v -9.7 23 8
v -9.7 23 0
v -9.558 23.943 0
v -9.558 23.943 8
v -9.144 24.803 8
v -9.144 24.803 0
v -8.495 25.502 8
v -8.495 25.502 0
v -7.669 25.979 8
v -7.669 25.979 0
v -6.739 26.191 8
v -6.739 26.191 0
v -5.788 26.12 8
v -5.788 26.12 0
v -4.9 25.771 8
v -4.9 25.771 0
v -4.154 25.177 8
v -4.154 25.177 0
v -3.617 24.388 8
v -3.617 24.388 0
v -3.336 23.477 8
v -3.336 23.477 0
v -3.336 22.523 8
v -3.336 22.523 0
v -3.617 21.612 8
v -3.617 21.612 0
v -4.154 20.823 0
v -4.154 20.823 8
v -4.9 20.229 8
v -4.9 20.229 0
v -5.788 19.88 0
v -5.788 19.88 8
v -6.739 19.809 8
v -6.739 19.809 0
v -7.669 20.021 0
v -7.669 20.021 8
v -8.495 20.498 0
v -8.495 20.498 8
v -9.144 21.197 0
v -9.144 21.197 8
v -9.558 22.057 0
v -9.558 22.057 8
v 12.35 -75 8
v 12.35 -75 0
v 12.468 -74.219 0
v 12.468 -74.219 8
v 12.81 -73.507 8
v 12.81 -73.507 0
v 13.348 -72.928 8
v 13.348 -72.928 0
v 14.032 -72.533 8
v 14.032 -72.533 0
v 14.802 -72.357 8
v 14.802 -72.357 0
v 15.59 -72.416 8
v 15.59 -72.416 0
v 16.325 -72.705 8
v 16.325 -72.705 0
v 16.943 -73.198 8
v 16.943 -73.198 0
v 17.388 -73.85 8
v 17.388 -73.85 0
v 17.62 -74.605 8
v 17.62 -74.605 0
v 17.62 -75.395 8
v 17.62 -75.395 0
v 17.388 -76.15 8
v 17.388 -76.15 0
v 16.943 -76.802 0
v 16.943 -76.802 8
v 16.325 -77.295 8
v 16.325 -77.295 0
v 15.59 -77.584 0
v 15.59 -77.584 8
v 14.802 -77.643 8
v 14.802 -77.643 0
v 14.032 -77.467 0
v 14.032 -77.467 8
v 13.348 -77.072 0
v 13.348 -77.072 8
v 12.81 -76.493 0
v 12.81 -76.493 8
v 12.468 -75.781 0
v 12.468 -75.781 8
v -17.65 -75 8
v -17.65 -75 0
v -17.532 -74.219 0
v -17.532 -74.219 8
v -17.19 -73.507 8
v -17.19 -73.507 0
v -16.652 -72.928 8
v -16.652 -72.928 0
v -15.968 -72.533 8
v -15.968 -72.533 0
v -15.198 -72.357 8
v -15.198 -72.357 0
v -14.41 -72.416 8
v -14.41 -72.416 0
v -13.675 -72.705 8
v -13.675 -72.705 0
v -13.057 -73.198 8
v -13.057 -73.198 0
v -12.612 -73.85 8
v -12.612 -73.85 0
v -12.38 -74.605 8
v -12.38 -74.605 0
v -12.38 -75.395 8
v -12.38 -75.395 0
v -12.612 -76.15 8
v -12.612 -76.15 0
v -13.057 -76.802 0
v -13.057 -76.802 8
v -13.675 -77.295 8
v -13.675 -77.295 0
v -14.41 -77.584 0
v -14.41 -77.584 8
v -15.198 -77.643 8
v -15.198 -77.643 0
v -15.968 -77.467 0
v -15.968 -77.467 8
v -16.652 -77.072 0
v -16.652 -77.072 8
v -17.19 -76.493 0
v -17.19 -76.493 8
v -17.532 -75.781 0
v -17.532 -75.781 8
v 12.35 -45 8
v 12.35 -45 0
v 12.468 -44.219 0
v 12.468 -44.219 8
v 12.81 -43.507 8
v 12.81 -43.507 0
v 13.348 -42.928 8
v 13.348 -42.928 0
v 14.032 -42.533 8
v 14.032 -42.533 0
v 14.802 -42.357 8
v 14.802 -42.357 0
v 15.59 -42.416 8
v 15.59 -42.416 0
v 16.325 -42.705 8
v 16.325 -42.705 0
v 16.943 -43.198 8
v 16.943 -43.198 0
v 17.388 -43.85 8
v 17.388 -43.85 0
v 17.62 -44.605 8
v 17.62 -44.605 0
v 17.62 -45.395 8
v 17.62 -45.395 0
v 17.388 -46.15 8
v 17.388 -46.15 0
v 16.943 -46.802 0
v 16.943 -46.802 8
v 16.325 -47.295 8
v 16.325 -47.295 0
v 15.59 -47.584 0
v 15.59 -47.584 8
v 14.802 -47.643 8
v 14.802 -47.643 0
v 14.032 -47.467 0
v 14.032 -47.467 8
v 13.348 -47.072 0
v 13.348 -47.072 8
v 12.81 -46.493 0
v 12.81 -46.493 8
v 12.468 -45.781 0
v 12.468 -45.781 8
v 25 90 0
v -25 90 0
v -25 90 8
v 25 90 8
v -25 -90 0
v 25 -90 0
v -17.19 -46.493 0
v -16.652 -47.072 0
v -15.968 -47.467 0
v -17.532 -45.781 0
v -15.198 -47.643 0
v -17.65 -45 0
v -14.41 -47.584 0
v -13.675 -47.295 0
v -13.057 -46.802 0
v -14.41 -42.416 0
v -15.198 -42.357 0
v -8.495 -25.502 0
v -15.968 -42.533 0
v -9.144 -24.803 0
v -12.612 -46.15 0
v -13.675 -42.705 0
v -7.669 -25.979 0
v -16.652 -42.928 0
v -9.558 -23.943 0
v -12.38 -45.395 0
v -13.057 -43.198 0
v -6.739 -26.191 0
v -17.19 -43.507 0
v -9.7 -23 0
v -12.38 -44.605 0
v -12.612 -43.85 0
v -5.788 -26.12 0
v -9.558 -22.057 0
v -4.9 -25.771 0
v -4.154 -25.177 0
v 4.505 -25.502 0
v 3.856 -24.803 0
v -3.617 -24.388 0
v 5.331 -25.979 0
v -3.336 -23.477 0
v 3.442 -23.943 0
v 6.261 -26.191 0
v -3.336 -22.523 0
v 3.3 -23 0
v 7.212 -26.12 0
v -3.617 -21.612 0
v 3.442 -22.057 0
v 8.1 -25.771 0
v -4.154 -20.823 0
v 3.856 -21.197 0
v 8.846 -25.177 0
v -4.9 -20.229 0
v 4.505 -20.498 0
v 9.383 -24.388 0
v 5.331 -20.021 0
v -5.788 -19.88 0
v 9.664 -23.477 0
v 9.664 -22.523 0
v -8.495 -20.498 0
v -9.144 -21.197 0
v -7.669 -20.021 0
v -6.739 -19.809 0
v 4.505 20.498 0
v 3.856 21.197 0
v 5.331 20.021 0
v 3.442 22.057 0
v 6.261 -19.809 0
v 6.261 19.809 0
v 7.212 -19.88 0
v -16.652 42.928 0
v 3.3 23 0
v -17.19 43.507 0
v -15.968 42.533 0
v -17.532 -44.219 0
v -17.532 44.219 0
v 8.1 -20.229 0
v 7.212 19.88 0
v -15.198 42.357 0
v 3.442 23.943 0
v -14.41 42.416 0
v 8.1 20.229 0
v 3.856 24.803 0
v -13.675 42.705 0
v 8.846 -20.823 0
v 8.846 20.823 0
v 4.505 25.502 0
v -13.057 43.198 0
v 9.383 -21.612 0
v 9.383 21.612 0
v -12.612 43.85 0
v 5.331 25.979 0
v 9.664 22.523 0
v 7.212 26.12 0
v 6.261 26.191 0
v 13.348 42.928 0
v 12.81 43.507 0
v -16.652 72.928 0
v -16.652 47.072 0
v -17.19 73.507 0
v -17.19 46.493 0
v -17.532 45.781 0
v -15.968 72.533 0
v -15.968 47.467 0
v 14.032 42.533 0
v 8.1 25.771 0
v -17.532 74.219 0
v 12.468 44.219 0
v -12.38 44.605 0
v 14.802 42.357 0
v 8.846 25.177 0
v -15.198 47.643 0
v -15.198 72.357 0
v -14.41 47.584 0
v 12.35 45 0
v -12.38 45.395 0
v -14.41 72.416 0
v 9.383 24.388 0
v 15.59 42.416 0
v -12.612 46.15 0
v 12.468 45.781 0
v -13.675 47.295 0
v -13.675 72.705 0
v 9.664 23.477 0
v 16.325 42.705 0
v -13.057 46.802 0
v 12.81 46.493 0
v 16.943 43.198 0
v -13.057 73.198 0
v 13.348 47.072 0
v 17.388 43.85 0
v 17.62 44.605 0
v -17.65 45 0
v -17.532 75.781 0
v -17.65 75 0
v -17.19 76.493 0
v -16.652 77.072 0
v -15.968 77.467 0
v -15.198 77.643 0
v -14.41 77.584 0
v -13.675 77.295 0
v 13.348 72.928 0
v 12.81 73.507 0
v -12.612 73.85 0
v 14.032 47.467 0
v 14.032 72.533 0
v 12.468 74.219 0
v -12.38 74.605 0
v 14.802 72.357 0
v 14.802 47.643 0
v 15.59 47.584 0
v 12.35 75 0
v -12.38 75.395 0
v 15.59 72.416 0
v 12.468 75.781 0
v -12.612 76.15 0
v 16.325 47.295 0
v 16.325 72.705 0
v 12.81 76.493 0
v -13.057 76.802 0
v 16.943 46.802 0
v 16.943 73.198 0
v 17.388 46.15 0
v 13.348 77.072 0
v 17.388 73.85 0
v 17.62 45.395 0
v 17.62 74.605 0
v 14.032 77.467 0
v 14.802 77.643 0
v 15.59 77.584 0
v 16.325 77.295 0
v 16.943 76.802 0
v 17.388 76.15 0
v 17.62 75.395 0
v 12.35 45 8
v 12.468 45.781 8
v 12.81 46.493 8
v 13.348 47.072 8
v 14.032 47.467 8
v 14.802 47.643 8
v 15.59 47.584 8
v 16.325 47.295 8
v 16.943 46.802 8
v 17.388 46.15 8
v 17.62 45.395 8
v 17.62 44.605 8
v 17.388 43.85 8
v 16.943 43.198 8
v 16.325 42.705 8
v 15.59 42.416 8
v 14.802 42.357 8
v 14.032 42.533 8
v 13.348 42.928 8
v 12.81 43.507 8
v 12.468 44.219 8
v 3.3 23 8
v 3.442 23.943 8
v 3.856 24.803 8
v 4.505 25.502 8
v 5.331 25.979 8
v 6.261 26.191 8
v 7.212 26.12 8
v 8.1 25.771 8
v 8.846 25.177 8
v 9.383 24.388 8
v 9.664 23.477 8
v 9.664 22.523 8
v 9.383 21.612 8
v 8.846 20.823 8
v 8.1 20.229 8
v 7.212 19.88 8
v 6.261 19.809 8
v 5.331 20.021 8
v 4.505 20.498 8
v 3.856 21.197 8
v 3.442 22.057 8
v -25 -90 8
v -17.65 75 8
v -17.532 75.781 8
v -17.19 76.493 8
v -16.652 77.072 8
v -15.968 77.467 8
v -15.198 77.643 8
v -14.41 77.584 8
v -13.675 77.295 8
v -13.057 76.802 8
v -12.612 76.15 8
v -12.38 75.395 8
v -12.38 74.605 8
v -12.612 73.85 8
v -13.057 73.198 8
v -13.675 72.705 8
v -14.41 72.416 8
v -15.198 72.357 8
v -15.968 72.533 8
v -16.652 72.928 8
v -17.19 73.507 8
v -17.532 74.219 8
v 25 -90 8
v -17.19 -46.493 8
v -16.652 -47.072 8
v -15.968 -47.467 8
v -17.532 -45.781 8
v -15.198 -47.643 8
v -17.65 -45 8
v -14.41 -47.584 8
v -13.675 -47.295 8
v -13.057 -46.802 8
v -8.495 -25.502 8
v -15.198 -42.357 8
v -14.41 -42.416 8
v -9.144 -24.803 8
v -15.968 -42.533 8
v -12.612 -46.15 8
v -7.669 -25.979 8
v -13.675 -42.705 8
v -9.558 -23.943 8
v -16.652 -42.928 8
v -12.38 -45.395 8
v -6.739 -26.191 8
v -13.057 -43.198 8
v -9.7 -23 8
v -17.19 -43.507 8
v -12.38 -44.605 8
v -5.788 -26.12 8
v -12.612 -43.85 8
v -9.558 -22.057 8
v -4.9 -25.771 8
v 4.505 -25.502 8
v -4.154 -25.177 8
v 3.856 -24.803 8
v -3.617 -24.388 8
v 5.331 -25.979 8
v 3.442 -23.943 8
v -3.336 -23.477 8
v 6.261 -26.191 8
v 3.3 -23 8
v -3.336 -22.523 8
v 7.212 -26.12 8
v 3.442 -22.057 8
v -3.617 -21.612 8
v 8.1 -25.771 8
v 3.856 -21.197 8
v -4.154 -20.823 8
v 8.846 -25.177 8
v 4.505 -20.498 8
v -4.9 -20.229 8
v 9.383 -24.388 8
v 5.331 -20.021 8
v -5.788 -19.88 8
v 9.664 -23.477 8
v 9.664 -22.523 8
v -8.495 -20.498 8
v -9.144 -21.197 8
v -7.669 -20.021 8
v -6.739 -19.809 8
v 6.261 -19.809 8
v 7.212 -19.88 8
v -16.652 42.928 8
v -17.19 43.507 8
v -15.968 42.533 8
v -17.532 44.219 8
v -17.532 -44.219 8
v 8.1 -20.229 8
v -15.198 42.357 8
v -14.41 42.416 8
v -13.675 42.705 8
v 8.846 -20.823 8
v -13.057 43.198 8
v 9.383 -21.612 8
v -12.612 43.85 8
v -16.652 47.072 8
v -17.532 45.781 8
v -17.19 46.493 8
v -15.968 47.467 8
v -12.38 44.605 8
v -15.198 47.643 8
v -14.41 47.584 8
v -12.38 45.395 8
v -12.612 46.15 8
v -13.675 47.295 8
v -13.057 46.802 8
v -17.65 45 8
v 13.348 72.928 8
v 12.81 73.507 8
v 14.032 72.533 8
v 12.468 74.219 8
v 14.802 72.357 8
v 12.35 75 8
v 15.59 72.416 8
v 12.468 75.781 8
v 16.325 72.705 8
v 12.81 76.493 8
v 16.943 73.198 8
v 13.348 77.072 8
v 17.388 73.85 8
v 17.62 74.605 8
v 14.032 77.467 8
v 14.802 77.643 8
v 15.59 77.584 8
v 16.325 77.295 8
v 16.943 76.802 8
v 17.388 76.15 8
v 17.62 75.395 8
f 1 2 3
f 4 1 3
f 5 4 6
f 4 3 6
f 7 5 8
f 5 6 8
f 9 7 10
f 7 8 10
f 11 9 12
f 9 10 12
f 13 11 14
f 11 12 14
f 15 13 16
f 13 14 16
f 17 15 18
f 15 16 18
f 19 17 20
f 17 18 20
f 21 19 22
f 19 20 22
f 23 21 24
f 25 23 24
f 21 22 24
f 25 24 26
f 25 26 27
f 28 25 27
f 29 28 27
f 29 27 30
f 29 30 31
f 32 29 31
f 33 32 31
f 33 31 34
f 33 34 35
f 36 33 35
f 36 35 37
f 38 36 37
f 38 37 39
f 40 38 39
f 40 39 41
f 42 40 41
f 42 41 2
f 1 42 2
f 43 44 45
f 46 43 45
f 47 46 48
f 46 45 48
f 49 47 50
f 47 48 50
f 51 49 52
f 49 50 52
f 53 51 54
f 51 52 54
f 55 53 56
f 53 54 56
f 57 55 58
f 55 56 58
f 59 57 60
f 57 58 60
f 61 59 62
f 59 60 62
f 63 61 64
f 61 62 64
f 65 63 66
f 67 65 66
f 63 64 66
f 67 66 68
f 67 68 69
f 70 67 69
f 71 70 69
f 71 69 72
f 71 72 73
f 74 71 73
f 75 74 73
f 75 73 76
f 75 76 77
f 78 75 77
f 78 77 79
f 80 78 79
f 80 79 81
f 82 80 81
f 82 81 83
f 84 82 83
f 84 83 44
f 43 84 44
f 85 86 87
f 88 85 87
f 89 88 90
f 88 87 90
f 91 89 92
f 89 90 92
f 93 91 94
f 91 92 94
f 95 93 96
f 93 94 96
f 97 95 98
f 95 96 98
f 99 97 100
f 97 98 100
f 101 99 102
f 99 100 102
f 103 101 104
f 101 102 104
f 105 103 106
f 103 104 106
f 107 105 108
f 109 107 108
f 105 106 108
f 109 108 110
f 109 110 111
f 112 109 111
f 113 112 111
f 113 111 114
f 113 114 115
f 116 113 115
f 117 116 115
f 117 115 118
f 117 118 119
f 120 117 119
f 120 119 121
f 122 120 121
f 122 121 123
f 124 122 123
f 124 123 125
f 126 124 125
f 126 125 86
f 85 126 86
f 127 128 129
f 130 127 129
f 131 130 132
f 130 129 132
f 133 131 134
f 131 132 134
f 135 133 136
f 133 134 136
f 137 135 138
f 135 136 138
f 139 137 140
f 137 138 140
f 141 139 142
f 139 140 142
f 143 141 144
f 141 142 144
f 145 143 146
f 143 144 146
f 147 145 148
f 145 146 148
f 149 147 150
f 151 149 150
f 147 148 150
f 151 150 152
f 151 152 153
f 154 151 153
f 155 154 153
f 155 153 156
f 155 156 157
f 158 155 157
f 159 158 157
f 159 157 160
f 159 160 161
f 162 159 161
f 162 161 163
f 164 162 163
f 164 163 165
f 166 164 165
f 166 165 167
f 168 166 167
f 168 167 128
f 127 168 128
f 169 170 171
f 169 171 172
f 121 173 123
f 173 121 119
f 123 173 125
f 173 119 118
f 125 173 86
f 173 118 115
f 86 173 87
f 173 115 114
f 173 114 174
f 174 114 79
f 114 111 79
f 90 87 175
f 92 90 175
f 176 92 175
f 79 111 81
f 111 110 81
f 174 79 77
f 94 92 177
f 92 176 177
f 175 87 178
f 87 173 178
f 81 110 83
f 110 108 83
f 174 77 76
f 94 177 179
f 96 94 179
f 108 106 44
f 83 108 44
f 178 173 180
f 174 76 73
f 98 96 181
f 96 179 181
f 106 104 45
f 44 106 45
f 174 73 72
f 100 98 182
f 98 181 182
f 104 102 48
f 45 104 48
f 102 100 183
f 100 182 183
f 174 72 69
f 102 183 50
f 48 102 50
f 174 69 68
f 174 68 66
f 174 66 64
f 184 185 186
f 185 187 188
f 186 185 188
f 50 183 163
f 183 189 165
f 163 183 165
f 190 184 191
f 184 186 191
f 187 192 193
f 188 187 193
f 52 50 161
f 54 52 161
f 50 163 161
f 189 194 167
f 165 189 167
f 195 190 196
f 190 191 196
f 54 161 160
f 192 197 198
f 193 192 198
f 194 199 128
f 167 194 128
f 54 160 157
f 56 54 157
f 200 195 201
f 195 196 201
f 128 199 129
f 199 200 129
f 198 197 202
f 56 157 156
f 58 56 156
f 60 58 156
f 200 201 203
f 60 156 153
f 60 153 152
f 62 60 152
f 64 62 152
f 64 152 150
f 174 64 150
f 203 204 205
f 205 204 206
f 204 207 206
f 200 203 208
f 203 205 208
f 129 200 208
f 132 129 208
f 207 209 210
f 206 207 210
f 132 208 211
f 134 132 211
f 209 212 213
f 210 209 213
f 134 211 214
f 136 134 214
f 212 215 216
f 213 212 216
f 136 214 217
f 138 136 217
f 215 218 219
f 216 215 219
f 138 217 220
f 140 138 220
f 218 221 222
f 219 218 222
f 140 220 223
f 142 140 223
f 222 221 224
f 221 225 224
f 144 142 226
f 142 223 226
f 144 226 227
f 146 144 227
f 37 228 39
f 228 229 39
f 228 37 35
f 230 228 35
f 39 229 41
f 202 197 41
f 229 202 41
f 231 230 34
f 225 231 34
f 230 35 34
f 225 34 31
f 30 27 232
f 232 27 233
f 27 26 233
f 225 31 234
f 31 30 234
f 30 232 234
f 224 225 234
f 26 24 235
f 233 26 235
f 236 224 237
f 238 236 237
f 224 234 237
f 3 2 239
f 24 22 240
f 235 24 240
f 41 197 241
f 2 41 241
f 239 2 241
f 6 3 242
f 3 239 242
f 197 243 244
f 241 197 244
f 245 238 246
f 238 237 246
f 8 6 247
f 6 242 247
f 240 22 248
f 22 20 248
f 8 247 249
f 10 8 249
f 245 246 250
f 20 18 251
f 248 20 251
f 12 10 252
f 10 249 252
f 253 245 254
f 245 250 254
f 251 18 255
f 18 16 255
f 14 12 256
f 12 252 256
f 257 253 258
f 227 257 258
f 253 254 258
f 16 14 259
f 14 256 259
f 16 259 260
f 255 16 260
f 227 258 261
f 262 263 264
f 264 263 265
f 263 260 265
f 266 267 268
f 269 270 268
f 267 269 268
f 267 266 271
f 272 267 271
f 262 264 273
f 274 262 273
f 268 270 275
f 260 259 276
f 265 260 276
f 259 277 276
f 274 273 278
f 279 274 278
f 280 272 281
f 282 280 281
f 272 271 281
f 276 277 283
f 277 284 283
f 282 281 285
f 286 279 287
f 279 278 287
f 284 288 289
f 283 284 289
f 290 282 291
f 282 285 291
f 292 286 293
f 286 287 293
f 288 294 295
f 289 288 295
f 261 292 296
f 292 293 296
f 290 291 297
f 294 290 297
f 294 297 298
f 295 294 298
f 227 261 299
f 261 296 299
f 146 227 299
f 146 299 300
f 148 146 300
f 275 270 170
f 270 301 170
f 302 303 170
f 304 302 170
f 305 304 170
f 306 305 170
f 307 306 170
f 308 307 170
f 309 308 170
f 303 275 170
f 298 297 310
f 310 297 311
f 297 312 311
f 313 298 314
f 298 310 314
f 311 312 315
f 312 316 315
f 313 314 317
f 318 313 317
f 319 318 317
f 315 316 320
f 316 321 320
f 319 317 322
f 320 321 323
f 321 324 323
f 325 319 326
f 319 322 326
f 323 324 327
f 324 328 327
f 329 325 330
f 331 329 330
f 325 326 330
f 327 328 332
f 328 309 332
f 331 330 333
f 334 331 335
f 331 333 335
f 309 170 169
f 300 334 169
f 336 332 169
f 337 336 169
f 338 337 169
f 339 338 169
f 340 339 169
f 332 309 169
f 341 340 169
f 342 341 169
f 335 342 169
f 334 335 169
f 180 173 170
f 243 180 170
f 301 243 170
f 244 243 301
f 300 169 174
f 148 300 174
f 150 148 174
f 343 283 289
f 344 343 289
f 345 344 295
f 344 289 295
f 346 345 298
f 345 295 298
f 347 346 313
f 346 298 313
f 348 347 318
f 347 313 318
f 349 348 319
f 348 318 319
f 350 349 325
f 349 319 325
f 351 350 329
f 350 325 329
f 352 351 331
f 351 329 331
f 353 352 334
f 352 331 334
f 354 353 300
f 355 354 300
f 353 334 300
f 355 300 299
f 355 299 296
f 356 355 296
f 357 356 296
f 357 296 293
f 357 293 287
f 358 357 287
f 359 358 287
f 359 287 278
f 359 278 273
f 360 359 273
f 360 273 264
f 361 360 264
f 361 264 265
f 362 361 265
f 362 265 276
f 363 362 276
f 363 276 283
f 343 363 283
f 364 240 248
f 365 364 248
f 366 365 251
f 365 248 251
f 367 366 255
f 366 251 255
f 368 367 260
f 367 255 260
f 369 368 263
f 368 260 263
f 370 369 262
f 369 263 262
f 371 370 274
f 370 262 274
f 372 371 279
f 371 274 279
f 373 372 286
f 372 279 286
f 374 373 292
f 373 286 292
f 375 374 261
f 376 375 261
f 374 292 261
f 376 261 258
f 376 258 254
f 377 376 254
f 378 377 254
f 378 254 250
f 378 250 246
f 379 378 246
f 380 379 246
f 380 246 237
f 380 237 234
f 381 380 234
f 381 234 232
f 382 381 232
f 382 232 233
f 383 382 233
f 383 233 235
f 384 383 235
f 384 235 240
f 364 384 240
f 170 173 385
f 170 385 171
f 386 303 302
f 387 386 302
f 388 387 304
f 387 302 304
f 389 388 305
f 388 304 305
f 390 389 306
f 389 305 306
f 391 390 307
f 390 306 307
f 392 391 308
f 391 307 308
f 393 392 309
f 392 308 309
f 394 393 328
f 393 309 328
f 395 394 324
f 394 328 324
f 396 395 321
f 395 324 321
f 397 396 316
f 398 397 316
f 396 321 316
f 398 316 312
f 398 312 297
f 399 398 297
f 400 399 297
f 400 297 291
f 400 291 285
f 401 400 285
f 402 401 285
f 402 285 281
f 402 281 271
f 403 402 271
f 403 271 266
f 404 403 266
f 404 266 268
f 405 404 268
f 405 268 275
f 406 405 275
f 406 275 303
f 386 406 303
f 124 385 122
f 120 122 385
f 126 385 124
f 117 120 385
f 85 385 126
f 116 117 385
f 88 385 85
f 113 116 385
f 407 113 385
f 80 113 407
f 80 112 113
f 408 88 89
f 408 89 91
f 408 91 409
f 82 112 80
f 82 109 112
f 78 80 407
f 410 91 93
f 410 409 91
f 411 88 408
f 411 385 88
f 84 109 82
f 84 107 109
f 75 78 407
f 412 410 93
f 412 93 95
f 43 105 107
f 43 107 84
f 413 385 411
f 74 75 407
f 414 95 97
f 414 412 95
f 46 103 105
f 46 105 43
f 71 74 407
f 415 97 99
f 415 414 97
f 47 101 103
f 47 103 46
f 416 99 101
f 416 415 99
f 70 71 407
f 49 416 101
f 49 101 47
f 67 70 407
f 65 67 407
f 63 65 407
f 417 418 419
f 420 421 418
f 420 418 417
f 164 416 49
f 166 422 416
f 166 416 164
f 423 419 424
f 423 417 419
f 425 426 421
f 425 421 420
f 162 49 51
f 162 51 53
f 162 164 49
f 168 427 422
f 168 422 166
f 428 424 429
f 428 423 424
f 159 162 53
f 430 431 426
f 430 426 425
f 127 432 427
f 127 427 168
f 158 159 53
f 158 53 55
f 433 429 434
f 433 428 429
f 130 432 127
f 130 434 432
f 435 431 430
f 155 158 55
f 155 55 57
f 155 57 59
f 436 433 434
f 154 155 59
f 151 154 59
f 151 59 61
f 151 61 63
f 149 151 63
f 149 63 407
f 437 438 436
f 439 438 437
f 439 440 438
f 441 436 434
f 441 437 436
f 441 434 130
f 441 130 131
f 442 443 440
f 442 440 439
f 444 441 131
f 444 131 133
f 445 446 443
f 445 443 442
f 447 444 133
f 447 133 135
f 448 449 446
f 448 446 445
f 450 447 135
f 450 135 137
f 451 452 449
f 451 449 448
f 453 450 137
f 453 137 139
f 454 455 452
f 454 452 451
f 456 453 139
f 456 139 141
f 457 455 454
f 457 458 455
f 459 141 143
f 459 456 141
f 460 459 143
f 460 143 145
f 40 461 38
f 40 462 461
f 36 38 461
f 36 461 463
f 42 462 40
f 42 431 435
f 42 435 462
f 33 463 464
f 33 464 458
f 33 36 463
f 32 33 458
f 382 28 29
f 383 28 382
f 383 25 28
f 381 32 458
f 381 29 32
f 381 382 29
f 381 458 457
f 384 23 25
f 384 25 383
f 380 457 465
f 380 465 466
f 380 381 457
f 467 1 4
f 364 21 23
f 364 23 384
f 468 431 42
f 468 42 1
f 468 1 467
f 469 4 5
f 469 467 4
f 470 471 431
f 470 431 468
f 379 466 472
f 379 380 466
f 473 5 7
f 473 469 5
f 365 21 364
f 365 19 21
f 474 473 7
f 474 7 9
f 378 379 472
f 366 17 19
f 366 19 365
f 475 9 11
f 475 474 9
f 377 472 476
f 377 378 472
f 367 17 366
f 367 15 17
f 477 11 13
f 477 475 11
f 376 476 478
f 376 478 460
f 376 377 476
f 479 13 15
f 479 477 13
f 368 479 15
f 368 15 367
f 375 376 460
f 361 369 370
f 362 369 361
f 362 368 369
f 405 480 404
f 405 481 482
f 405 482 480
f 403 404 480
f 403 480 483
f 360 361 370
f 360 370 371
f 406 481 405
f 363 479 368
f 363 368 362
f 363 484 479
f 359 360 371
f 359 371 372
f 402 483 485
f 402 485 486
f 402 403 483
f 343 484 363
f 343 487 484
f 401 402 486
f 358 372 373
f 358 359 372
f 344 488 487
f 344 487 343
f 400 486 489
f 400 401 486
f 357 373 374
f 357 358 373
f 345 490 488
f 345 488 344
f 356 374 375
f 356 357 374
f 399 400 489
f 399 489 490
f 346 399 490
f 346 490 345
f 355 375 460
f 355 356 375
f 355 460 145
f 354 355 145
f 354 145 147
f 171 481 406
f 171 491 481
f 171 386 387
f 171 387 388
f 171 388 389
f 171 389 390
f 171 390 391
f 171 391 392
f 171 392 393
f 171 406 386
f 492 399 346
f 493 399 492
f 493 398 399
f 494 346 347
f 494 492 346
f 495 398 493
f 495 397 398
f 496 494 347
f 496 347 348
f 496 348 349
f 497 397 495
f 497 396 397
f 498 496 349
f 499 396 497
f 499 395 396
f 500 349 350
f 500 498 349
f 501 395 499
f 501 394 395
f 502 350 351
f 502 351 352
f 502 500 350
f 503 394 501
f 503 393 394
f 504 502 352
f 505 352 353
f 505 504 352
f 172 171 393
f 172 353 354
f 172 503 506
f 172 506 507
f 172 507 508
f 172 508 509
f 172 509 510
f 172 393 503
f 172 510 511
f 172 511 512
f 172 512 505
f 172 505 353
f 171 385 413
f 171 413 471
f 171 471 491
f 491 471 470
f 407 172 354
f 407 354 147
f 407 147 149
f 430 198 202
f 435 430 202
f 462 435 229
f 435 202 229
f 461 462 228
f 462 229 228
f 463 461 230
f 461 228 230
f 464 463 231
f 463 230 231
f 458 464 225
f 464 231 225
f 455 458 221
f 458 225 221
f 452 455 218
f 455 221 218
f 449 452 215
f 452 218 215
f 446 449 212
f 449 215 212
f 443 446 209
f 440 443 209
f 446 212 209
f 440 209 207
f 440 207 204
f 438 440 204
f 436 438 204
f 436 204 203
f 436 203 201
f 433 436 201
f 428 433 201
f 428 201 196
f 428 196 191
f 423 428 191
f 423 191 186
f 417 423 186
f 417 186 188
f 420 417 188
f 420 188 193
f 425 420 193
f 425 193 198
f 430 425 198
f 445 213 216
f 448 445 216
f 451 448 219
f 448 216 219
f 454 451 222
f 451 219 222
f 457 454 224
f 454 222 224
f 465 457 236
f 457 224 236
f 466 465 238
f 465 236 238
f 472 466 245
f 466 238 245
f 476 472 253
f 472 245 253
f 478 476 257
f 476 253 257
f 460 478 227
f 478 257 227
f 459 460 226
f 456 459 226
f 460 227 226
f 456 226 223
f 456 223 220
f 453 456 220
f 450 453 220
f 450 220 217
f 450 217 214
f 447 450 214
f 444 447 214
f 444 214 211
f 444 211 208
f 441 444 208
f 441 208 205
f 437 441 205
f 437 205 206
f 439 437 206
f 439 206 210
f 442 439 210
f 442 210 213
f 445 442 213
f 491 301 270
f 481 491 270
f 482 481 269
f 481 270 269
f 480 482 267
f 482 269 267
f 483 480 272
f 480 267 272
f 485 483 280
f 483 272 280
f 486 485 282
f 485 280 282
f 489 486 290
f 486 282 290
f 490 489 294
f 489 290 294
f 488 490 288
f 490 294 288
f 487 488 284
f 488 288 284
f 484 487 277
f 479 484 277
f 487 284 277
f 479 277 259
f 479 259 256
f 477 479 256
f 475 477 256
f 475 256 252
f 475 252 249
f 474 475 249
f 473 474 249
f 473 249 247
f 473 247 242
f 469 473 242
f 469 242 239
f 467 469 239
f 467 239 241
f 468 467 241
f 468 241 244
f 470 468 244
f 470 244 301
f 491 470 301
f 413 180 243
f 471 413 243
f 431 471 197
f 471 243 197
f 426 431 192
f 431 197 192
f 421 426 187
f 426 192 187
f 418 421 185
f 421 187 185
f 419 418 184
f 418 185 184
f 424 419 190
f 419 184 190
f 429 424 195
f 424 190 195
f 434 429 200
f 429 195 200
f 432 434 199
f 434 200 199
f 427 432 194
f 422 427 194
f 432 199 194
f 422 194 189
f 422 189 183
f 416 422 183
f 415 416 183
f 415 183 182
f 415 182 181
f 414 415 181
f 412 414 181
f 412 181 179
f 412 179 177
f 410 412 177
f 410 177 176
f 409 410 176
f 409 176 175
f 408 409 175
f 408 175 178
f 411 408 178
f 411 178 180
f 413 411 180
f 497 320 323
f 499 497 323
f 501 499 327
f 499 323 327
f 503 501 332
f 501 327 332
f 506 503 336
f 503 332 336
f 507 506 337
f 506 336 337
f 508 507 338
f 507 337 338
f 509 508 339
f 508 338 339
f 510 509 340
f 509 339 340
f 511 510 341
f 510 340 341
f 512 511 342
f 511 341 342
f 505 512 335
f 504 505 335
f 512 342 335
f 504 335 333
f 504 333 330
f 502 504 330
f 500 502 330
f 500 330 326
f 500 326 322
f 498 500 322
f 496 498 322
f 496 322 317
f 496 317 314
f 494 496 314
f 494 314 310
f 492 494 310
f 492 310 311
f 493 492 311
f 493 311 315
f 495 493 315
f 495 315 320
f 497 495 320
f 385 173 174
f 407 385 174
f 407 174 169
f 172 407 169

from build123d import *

# Parameters (mm, degrees)
SKETCH1_W            = 50
SKETCH1_H            = 180
BOSS_EXTRUDE1_DEPTH  = 8
M5_CLEARANCE_HOLE1_D = 5.3
M6_CLEARANCE_HOLE1_D = 6.4


with BuildPart() as part:
    # Sketch1 → Boss-Extrude1 (new body)
    with BuildSketch(Plane.XY):
        Rectangle(SKETCH1_W, SKETCH1_H)
    extrude(amount=BOSS_EXTRUDE1_DEPTH)

    # M5 Clearance Hole1 (through all)
    with Locations(Plane.XY.offset(8)):
        with Locations((-15, 45), (-15, -45), (15, -45), (15, 45), (-15, 75), (-15, -75), (15, -75), (15, 75)):
            Hole(M5_CLEARANCE_HOLE1_D / 2)

    # M6 Clearance Hole1 (through all)
    with Locations(Plane.XY.offset(8)):
        with Locations((-6.5, 23), (-6.5, -23), (6.5, -23), (6.5, 23)):
            Hole(M6_CLEARANCE_HOLE1_D / 2)


solid = part.part
